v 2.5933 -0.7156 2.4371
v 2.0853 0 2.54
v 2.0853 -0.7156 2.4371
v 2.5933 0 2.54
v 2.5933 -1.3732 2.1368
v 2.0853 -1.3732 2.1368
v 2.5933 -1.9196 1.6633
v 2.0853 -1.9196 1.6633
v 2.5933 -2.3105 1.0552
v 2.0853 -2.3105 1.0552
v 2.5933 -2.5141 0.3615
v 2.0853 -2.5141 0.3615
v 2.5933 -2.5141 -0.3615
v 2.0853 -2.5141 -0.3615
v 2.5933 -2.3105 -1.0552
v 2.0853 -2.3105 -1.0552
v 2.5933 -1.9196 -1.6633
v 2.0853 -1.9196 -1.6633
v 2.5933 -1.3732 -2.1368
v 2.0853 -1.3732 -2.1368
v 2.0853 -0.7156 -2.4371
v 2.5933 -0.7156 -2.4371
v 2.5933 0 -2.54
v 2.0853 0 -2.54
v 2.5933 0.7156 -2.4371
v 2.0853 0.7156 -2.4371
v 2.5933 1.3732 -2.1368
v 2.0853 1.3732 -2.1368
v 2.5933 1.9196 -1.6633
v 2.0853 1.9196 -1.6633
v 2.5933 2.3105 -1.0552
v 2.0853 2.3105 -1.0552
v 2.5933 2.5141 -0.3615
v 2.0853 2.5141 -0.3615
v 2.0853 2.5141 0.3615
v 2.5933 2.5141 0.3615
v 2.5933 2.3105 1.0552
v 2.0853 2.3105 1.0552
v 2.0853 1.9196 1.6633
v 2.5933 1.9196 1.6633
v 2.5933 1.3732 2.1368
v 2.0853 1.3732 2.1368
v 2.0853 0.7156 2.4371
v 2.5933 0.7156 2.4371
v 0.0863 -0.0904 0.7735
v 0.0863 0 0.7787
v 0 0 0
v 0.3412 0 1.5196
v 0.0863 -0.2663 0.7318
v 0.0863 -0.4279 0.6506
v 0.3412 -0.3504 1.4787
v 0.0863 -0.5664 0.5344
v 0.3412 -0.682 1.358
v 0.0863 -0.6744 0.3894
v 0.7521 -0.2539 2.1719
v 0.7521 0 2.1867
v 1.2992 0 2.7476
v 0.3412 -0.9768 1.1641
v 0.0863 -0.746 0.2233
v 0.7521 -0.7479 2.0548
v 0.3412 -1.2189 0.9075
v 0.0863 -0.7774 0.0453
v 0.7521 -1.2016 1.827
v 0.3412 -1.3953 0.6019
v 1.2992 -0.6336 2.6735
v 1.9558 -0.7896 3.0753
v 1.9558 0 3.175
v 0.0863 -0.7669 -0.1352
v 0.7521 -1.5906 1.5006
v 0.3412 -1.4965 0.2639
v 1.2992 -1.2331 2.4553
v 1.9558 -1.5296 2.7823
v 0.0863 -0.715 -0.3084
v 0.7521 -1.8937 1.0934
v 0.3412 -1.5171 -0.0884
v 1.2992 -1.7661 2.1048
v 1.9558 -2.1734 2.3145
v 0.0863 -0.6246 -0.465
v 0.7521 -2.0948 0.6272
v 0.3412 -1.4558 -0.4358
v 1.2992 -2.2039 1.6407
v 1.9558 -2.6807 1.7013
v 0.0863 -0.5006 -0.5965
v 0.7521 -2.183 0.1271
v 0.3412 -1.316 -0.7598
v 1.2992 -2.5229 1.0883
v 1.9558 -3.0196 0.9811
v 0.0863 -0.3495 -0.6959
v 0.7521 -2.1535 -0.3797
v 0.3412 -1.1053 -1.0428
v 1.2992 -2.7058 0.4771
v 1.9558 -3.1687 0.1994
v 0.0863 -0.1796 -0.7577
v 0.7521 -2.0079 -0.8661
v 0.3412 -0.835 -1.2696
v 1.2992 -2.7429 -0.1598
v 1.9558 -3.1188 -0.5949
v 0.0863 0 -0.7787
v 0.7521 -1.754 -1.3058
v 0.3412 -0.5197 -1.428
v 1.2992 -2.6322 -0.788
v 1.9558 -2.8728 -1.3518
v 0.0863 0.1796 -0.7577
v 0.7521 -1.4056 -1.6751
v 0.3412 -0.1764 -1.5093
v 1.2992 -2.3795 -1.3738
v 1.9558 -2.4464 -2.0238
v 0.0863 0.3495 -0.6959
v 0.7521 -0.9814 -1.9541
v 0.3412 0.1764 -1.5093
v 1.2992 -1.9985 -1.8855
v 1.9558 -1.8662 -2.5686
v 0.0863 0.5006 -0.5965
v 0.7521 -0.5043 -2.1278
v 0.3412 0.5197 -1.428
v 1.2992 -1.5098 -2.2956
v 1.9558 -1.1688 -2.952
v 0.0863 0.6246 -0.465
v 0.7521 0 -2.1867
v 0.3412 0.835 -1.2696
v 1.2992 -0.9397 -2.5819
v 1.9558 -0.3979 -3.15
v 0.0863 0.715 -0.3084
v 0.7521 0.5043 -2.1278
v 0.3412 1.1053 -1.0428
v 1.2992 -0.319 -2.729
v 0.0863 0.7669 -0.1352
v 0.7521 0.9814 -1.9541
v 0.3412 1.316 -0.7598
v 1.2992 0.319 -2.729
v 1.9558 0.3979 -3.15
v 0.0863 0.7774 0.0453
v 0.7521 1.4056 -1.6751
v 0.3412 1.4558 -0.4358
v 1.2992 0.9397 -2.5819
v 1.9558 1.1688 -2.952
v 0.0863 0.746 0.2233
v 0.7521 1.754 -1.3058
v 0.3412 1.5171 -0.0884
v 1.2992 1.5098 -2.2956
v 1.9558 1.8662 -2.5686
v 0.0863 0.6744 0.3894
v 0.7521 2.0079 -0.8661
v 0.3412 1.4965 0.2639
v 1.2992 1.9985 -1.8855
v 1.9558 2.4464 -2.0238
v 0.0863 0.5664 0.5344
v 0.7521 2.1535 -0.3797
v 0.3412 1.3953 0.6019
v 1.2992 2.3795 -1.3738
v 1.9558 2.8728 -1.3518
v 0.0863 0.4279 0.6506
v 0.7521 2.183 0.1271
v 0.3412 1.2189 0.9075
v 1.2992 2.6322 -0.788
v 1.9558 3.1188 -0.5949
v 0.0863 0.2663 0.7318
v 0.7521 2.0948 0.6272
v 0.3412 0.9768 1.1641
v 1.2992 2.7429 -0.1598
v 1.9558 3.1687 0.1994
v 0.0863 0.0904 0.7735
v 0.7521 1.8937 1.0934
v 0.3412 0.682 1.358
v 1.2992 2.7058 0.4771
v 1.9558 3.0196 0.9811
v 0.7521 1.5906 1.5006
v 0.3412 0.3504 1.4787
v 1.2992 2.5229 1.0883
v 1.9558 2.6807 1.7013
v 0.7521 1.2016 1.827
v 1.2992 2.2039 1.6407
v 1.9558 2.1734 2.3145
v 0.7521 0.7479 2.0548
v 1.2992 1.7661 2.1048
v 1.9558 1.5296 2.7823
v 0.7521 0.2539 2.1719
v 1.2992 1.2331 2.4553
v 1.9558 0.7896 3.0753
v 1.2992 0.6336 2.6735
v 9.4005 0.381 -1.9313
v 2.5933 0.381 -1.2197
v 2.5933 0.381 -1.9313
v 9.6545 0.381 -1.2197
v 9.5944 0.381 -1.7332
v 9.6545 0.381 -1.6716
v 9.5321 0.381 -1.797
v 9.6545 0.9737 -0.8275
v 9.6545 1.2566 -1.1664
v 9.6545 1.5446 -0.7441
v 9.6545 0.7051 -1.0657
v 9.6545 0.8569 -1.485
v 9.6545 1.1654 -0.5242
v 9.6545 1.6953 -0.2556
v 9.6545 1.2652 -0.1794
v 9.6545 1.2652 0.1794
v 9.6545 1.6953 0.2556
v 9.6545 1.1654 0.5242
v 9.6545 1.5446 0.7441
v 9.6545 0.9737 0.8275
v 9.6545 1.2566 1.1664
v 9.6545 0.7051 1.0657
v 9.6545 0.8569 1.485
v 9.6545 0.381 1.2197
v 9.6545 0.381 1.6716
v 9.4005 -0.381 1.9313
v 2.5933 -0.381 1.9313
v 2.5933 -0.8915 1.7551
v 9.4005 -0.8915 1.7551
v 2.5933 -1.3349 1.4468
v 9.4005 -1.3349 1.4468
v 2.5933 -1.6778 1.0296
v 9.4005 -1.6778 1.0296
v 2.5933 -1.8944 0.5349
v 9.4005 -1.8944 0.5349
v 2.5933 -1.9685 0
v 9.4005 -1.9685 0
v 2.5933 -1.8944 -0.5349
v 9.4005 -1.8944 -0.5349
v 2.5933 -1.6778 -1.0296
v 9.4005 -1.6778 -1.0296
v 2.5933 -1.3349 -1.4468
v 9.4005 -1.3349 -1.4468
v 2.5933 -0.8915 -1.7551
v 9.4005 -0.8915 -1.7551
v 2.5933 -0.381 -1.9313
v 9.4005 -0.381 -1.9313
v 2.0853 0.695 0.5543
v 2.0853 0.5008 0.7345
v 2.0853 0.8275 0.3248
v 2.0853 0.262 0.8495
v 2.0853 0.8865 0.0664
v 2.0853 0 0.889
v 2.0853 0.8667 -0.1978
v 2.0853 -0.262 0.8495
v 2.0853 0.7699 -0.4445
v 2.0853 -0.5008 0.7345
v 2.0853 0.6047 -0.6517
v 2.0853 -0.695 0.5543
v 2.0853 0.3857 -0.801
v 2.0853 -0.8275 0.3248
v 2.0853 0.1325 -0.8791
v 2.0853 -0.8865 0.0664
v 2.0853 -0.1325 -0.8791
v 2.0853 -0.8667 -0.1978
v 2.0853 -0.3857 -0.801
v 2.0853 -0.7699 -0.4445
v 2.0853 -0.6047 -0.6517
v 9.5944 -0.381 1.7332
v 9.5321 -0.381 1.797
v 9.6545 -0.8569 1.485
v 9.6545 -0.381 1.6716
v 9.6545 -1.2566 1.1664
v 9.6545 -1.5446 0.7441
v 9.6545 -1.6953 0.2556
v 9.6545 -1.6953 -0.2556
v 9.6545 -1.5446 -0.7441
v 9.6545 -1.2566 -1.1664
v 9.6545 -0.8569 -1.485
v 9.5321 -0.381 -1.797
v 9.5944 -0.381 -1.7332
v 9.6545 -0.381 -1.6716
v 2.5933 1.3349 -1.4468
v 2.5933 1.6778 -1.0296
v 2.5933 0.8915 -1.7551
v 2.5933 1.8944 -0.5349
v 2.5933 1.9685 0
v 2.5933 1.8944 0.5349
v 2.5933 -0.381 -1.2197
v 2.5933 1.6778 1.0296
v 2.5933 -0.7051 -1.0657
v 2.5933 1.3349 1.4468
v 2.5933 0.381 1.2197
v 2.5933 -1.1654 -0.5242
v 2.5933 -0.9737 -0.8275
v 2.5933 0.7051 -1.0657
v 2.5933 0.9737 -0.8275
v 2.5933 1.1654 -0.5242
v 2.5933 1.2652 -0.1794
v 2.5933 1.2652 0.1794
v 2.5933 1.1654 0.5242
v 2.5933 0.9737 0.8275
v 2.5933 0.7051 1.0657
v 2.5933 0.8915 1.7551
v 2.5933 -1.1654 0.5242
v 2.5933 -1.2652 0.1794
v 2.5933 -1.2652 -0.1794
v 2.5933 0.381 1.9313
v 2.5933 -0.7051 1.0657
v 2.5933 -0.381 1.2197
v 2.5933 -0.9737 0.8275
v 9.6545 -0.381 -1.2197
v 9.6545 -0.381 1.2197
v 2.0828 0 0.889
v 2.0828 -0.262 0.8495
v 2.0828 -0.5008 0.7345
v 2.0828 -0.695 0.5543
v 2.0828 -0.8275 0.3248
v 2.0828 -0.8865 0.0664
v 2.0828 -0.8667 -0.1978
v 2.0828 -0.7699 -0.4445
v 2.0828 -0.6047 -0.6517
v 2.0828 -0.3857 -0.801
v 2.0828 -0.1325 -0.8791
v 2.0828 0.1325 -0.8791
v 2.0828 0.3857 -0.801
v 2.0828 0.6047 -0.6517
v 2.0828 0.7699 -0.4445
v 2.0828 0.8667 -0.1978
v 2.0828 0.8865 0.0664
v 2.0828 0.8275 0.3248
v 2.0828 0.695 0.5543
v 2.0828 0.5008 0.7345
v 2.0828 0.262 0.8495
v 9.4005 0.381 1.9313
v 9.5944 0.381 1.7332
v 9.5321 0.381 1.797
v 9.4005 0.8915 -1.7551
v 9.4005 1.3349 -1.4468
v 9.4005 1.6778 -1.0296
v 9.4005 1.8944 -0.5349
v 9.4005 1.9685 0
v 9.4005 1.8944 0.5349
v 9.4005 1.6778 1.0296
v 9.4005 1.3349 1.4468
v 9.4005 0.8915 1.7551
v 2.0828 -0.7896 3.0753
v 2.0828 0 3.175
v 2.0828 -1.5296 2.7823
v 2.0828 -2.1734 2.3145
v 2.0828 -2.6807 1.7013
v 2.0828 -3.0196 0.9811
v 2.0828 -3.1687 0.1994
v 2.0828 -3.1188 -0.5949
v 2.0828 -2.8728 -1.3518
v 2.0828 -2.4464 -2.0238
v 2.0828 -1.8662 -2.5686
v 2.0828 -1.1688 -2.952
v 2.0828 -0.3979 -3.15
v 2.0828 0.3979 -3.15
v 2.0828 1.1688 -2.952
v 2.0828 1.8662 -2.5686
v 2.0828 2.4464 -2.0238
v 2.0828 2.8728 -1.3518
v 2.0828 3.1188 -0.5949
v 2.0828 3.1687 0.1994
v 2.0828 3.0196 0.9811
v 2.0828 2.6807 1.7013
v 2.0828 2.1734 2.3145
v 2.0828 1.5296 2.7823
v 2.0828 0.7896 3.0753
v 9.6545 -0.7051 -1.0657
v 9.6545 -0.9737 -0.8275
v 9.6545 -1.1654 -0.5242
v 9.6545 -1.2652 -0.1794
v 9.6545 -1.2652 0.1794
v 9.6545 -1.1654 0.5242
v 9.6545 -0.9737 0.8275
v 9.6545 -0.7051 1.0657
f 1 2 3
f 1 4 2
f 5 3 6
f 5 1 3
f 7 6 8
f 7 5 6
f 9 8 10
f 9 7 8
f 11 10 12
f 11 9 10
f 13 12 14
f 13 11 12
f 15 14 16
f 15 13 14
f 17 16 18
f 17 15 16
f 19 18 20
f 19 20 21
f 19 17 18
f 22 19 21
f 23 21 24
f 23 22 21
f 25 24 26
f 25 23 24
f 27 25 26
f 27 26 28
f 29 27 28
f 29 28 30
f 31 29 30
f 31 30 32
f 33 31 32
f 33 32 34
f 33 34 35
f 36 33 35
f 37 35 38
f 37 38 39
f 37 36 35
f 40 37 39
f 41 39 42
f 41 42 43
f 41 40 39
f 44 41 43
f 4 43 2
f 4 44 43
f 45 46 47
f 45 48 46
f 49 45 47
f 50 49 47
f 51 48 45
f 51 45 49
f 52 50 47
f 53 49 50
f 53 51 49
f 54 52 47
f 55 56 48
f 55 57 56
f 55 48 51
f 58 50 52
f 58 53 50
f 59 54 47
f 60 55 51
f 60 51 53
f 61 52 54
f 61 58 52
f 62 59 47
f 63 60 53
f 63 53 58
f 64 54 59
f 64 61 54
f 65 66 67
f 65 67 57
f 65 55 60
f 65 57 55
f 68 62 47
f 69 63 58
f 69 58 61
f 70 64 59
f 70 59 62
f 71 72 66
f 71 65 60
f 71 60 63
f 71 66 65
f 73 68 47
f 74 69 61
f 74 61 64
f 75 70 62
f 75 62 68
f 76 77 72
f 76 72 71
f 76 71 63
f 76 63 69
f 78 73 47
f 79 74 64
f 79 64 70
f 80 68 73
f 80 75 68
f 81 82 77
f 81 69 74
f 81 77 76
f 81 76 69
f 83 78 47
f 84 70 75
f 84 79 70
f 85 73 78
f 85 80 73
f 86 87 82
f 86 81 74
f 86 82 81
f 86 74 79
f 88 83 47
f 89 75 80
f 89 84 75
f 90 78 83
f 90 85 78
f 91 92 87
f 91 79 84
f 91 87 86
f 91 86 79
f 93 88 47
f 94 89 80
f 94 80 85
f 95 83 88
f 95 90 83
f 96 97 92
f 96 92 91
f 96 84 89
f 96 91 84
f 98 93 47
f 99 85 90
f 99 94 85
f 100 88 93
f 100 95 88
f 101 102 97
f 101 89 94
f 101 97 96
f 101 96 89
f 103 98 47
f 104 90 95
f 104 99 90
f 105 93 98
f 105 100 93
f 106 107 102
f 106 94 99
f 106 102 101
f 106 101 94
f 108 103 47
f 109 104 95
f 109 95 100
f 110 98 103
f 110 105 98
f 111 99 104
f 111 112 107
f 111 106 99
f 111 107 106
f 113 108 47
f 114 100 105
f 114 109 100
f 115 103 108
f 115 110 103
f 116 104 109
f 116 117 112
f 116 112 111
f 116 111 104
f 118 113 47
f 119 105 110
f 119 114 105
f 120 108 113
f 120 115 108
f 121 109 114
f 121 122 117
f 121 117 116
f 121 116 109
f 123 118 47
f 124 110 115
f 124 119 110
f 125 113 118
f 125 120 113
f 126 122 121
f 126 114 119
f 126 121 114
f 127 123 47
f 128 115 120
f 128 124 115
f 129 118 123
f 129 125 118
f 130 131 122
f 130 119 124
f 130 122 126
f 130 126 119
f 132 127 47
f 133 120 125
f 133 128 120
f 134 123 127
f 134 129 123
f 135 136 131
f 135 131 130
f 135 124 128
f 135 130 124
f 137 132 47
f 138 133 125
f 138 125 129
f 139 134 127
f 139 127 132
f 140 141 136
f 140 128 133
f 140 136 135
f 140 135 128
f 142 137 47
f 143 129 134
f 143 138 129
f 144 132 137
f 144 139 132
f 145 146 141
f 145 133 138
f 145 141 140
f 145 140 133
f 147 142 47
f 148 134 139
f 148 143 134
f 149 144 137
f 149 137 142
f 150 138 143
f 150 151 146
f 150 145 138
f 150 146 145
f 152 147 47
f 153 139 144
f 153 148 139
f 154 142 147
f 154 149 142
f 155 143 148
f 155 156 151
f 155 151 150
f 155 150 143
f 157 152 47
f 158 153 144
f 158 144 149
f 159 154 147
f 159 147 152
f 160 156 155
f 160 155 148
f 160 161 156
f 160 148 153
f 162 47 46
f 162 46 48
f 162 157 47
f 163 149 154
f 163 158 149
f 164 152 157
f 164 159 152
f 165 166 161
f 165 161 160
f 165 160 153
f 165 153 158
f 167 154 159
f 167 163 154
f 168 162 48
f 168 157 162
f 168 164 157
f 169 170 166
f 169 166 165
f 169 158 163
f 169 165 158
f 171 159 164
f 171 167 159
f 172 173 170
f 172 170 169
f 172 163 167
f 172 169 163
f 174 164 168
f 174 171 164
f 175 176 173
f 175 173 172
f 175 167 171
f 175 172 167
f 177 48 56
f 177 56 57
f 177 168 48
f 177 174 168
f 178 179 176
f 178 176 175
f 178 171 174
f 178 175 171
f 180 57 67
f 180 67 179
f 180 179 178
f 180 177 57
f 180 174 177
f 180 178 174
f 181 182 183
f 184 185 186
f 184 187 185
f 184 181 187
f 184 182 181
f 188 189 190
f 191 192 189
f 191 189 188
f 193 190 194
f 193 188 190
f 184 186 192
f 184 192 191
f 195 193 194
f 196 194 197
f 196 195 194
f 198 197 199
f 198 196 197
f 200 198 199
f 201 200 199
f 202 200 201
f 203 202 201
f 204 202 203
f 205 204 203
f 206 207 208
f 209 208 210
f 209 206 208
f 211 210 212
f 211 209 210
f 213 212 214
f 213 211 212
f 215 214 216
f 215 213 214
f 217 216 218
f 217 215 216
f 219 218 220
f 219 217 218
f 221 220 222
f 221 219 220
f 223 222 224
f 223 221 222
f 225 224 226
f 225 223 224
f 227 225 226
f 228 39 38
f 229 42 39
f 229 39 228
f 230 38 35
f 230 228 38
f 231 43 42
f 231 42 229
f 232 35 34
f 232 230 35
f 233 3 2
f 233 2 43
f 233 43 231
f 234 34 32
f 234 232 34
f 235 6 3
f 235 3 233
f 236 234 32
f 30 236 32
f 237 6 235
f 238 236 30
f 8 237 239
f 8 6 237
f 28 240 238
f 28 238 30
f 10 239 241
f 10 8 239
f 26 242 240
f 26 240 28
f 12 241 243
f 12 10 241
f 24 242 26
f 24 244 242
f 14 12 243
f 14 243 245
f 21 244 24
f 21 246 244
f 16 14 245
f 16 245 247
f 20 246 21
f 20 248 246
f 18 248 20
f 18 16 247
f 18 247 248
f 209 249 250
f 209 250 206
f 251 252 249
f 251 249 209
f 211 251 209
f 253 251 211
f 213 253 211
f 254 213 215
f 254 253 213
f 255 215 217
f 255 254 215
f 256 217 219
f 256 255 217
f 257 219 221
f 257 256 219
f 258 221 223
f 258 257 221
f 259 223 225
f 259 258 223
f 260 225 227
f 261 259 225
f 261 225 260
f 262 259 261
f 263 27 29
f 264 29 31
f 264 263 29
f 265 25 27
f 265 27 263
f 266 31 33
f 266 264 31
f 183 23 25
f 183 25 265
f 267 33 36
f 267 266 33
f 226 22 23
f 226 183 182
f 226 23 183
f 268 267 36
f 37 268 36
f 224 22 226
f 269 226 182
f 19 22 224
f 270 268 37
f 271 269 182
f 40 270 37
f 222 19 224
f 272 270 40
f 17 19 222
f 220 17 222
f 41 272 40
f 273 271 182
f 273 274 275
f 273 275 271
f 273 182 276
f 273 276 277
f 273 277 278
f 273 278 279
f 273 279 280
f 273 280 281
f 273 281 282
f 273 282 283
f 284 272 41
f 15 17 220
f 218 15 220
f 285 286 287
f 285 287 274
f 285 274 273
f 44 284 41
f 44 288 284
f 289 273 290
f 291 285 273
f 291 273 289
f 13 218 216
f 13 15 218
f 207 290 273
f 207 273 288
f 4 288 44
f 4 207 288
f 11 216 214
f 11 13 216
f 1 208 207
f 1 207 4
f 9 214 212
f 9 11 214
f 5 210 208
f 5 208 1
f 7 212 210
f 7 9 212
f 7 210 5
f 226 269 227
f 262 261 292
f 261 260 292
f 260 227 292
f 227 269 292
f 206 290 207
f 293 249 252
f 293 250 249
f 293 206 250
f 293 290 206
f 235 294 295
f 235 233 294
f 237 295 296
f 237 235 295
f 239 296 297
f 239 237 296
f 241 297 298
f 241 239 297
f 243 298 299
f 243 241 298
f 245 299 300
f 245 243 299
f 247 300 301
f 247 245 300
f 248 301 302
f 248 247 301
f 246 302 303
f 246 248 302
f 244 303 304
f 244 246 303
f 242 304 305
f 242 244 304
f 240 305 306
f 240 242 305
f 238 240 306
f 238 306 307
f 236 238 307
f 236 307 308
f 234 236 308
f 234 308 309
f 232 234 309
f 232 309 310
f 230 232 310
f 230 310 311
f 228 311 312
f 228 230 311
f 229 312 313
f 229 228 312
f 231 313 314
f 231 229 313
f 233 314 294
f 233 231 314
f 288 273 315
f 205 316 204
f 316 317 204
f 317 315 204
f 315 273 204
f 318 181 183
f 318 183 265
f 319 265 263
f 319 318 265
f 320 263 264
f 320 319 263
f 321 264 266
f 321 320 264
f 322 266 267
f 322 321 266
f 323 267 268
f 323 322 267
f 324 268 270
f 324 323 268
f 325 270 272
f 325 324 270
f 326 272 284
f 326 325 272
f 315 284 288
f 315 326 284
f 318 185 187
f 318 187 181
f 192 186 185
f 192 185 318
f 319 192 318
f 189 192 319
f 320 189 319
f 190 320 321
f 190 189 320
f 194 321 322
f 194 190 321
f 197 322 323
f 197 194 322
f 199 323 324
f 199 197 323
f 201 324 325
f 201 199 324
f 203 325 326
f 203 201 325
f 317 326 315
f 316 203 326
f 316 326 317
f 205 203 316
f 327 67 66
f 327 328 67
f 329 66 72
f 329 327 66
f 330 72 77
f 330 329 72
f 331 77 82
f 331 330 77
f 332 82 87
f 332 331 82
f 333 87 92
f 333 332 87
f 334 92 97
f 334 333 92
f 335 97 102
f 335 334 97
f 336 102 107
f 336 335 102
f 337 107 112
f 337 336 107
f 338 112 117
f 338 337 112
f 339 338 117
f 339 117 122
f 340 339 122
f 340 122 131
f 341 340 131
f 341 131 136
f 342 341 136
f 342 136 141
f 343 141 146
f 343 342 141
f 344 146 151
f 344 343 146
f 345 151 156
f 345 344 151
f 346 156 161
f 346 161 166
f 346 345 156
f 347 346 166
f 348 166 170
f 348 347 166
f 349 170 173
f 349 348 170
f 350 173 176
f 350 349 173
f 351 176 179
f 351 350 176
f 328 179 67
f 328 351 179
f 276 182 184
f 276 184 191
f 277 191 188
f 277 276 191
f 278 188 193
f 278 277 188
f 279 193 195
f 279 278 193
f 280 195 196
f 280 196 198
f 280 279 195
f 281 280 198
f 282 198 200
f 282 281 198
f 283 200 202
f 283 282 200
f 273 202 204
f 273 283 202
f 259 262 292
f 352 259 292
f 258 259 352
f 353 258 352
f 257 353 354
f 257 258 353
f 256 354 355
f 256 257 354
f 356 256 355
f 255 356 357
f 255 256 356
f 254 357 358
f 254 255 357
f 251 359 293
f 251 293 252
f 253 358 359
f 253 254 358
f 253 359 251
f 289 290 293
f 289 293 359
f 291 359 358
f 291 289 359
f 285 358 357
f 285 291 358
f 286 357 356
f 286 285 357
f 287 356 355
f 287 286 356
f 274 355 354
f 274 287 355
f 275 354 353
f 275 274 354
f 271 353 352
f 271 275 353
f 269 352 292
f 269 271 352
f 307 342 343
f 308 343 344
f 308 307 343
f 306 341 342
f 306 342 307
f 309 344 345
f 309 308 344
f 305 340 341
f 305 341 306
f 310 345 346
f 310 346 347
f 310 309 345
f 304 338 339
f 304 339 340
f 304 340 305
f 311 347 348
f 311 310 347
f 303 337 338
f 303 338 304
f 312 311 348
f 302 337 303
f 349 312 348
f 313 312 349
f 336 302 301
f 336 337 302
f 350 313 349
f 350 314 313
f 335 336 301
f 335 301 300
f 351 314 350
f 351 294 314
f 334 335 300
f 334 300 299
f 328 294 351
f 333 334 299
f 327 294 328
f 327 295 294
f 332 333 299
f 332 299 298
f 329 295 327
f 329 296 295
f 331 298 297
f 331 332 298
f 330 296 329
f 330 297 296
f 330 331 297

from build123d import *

# Parameters (mm, degrees)
CHAMFER1_SIZE           = 0.254
SKETCH2_W               = 7.0612
SKETCH2_H               = 0.762
CUT_EXTRUDE1_DEPTH      = 4.175
CUT_EXTRUDE1_DEPTH_BACK = 4.175


with BuildPart() as part:
    # Sketch1 → Revolve1 (revolve)
    with BuildSketch(Plane.XY, mode=Mode.PRIVATE) as revolve1_sk:
        with BuildLine():
            Line((1.9558, 3.175), (2.0828, 3.175))
            Line((2.0828, 3.175), (2.0828, 0.889))
            Line((2.0828, 0.889), (2.08534, 0.889))
            Line((2.08534, 0.889), (2.08534, 2.54))
            Line((2.08534, 2.54), (2.59334, 2.54))
            Line((2.59334, 2.54), (2.59334, 1.9685))
            Line((2.59334, 1.9685), (9.65454, 1.9685))
            Line((9.65454, 1.9685), (9.65454, 1.277822692))
            Line((9.65454, 1.277822692), (2.59334, 1.277822692))
            Line((2.59334, 1.277822692), (2.59334, 0))
            Line((2.59334, 0), (0, 0))
            ThreePointArc((0, 0), (0.528187929, 1.864522636), (1.9558, 3.175))
        make_face()
    revolve(revolve1_sk.sketch.rotate(Axis((0, 0, 0), (1, 0, 0)), 90), axis=Axis((0, 0, 0), (1, 0, 0)))  # turned: the seam where the file's is

    # Chamfer1
    chamfer1_edges = [part.edges().sort_by_distance(p)[0] for p in [
        (9.65454, 0, -1.9685),
    ]]
    chamfer(chamfer1_edges, length=CHAMFER1_SIZE)

    # Sketch2 → Cut-Extrude1 (cut, two sides)
    with BuildSketch(Plane.XY) as cut_extrude1_sk:
        with Locations((6.12394, 0)):
            Rectangle(SKETCH2_W, SKETCH2_H)
    extrude(amount=CUT_EXTRUDE1_DEPTH, mode=Mode.SUBTRACT)
    extrude(cut_extrude1_sk.sketch, amount=-CUT_EXTRUDE1_DEPTH_BACK, mode=Mode.SUBTRACT)


solid = part.part
